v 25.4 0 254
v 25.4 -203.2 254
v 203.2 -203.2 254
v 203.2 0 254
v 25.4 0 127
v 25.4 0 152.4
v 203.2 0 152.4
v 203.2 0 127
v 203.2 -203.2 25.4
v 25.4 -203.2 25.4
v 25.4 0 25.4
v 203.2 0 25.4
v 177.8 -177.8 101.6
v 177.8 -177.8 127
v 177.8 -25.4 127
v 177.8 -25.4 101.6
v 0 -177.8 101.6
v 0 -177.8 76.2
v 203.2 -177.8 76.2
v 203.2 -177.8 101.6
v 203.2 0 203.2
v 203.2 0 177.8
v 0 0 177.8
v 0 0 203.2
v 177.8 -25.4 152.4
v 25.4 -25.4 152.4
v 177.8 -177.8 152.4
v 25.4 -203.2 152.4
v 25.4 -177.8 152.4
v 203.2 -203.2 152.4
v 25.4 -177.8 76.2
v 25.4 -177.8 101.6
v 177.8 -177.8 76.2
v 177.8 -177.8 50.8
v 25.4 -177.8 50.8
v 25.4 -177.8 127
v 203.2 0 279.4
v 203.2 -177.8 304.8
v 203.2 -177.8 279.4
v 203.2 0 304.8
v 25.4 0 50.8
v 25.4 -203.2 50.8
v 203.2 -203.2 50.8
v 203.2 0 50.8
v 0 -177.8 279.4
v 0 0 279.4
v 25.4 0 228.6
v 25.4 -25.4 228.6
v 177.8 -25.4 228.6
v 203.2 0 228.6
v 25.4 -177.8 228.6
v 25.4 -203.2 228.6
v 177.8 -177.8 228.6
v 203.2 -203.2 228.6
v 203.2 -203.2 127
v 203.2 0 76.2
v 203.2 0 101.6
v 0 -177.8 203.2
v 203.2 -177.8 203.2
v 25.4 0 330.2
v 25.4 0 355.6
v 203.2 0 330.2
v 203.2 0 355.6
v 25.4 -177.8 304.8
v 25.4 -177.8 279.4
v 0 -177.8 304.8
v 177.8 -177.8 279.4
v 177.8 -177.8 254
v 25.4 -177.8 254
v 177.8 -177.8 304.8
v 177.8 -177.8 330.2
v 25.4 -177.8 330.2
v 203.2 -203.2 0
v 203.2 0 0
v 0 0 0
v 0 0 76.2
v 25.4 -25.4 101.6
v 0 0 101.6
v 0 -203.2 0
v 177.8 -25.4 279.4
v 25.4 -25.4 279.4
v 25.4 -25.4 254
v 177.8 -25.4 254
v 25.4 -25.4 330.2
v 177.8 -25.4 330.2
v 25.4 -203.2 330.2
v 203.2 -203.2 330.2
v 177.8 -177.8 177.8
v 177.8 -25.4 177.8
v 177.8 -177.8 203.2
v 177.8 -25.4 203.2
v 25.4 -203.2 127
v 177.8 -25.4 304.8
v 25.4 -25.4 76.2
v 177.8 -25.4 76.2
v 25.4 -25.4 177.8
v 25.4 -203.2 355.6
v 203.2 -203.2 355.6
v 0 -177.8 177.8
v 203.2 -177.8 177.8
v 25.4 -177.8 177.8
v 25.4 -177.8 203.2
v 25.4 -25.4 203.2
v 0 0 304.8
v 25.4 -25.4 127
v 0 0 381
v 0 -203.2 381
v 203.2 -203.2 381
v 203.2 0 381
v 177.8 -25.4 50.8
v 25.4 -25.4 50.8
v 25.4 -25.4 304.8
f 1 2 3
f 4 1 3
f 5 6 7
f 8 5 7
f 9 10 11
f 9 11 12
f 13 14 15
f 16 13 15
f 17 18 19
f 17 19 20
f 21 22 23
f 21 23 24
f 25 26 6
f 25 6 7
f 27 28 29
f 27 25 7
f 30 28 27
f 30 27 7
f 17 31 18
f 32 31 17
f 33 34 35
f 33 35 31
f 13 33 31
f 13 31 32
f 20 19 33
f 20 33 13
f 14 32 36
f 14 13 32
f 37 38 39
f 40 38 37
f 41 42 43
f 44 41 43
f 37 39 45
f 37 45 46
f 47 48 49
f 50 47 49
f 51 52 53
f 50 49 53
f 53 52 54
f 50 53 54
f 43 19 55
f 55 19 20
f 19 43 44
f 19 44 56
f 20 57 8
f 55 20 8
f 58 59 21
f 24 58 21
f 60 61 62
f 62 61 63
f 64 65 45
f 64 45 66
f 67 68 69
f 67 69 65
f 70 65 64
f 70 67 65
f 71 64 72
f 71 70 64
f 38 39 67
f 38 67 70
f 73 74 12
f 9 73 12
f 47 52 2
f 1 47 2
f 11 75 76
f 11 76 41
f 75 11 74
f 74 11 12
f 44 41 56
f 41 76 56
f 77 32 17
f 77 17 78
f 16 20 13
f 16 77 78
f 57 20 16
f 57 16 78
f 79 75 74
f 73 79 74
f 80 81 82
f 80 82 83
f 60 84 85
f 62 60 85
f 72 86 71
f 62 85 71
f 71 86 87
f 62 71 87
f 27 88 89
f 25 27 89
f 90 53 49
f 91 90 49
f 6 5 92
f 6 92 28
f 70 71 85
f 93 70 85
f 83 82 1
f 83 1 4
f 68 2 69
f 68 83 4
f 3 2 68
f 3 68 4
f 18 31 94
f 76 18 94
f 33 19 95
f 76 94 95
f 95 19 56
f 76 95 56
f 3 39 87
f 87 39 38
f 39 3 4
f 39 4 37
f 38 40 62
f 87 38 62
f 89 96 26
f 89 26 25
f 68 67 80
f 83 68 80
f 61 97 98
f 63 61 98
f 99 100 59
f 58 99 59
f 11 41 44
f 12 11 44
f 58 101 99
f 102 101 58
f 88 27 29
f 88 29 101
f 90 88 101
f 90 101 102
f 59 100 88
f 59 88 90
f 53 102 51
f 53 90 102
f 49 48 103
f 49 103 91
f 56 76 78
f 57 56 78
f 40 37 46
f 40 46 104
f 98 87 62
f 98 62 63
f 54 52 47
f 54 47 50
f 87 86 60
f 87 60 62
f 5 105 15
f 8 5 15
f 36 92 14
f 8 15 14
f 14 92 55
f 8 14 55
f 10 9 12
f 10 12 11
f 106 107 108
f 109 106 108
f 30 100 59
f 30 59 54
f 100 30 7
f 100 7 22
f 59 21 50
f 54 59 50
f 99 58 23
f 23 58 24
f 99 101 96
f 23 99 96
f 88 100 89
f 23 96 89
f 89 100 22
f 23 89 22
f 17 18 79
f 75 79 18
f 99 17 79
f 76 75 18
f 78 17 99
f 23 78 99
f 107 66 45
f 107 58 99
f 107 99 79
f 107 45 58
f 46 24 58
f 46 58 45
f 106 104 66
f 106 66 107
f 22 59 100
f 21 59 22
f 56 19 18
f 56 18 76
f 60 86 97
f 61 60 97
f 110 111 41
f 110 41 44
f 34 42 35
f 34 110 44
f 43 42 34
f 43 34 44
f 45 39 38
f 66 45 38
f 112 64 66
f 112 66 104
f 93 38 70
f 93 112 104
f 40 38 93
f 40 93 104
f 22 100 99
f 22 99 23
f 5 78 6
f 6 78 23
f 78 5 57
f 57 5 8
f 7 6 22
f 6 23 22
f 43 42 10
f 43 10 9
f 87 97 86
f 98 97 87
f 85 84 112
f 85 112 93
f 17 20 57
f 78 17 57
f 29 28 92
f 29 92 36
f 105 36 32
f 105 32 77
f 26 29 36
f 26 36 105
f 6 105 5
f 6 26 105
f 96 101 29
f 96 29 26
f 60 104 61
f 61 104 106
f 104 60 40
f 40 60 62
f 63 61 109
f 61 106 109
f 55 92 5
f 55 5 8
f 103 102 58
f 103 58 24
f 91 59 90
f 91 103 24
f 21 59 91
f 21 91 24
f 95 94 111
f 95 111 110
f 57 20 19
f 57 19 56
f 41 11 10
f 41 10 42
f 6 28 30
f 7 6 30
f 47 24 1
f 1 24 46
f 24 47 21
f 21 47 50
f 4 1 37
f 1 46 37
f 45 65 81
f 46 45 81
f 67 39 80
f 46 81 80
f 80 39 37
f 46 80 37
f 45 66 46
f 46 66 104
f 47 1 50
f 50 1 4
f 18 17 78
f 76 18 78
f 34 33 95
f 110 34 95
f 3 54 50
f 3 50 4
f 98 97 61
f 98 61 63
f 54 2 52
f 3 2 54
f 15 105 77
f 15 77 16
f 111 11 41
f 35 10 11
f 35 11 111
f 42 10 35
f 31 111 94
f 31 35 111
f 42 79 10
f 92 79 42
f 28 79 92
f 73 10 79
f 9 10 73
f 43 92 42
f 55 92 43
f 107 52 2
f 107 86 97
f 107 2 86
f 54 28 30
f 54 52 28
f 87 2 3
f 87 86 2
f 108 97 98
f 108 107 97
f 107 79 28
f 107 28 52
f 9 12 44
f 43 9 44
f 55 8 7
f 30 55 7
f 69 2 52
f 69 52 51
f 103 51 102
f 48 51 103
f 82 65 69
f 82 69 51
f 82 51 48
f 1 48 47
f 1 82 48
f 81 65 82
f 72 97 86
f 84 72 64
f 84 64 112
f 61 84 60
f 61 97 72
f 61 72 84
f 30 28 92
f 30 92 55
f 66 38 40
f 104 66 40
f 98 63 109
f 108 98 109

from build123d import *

# Parameters (mm, degrees)
F0_W      = 203.2
F0_H      = 381
F1_DEPTH  = 203.2
F2_W      = 177.8
F2_H      = 25.4
F3_DEPTH  = 203.201
F4_W      = 177.8
F4_H      = 25.4
F5_DEPTH  = 203.201
F6_W      = 152.4
F6_H      = 152.4
F7_DEPTH  = 381.001
F8_DEPTH  = 203.2
F9_DEPTH  = 203.2
F10_DEPTH = 152.4
F11_DEPTH = 152.4


with BuildPart() as f1:
    # F0 (on Front) → F1 (new body)
    with BuildSketch(Plane.XZ):
        with Locations((101.6, 190.5)):
            Rectangle(F0_W, F0_H)
    extrude(amount=F1_DEPTH)

    # F2 (on face) → F3 (cut, through all)
    with BuildSketch(Plane.XZ.offset(203.2)):
        with Locations((114.3, 342.9)):
            Rectangle(F2_W, F2_H)
        with Locations((114.3, 241.3)):
            Rectangle(F2_W, F2_H)
        with Locations((114.3, 139.7)):
            Rectangle(F2_W, F2_H)
        with Locations((114.3, 38.1)):
            Rectangle(F2_W, F2_H)
    extrude(amount=-F3_DEPTH, mode=Mode.SUBTRACT)

    # F4 (on face) → F5 (cut, through all)
    with BuildSketch(Plane.YZ.offset(203.2)):
        with Locations((-88.9, 292.1)):
            Rectangle(F4_W, F4_H)
        with Locations((-88.9, 190.5)):
            Rectangle(F4_W, F4_H)
        with Locations((-88.9, 88.9)):
            Rectangle(F4_W, F4_H)
    extrude(amount=-F5_DEPTH, mode=Mode.SUBTRACT)

    # F6 (on face) → F7 (cut, through all)
    with BuildSketch(Plane.XY.offset(381)):
        with Locations((101.6, -101.6)):
            Rectangle(F6_W, F6_H)
    extrude(amount=-F7_DEPTH, mode=Mode.SUBTRACT)

    # F10 (add, through all): a face of the model
    f10_faces = [f1.faces().sort_by_distance(p)[0] for p in [
        (101.6, -177.8, 368.3),
    ]]
    extrude(f10_faces, amount=F10_DEPTH)

    # F11 (add, through all): a face of the model
    f11_faces = [f1.faces().sort_by_distance(p)[0] for p in [
        (101.6, -177.8, 12.7),
    ]]
    extrude(f11_faces, amount=F11_DEPTH)


with BuildPart() as f8:
    # F2 (on face) → F8 (new body)
    with BuildSketch(Plane.XZ.offset(203.2)):
        with Locations((114.3, 342.9)):
            Rectangle(F2_W, F2_H)
    extrude(amount=-F8_DEPTH)


with BuildPart() as f8b:
    # F2 (on face) → F8, piece 2 (new body)
    with BuildSketch(Plane.XZ.offset(203.2)):
        with Locations((114.3, 241.3)):
            Rectangle(F2_W, F2_H)
    extrude(amount=-F8_DEPTH)


with BuildPart() as f8c:
    # F2 (on face) → F8, piece 3 (new body)
    with BuildSketch(Plane.XZ.offset(203.2)):
        with Locations((114.3, 139.7)):
            Rectangle(F2_W, F2_H)
    extrude(amount=-F8_DEPTH)


with BuildPart() as f8d:
    # F2 (on face) → F8, piece 4 (new body)
    with BuildSketch(Plane.XZ.offset(203.2)):
        with Locations((114.3, 38.1)):
            Rectangle(F2_W, F2_H)
    extrude(amount=-F8_DEPTH)


with BuildPart() as f9:
    # F4 (on face) → F9 (new body)
    with BuildSketch(Plane.YZ.offset(203.2)):
        with Locations((-88.9, 292.1)):
            Rectangle(F4_W, F4_H)
    extrude(amount=-F9_DEPTH)


with BuildPart() as f9b:
    # F4 (on face) → F9, piece 2 (new body)
    with BuildSketch(Plane.YZ.offset(203.2)):
        with Locations((-88.9, 190.5)):
            Rectangle(F4_W, F4_H)
    extrude(amount=-F9_DEPTH)


with BuildPart() as f9c:
    # F4 (on face) → F9, piece 3 (new body)
    with BuildSketch(Plane.YZ.offset(203.2)):
        with Locations((-88.9, 88.9)):
            Rectangle(F4_W, F4_H)
    extrude(amount=-F9_DEPTH)


solid = Compound([f1.part, f8.part, f8b.part, f8c.part, f8d.part, f9.part, f9b.part, f9c.part])
